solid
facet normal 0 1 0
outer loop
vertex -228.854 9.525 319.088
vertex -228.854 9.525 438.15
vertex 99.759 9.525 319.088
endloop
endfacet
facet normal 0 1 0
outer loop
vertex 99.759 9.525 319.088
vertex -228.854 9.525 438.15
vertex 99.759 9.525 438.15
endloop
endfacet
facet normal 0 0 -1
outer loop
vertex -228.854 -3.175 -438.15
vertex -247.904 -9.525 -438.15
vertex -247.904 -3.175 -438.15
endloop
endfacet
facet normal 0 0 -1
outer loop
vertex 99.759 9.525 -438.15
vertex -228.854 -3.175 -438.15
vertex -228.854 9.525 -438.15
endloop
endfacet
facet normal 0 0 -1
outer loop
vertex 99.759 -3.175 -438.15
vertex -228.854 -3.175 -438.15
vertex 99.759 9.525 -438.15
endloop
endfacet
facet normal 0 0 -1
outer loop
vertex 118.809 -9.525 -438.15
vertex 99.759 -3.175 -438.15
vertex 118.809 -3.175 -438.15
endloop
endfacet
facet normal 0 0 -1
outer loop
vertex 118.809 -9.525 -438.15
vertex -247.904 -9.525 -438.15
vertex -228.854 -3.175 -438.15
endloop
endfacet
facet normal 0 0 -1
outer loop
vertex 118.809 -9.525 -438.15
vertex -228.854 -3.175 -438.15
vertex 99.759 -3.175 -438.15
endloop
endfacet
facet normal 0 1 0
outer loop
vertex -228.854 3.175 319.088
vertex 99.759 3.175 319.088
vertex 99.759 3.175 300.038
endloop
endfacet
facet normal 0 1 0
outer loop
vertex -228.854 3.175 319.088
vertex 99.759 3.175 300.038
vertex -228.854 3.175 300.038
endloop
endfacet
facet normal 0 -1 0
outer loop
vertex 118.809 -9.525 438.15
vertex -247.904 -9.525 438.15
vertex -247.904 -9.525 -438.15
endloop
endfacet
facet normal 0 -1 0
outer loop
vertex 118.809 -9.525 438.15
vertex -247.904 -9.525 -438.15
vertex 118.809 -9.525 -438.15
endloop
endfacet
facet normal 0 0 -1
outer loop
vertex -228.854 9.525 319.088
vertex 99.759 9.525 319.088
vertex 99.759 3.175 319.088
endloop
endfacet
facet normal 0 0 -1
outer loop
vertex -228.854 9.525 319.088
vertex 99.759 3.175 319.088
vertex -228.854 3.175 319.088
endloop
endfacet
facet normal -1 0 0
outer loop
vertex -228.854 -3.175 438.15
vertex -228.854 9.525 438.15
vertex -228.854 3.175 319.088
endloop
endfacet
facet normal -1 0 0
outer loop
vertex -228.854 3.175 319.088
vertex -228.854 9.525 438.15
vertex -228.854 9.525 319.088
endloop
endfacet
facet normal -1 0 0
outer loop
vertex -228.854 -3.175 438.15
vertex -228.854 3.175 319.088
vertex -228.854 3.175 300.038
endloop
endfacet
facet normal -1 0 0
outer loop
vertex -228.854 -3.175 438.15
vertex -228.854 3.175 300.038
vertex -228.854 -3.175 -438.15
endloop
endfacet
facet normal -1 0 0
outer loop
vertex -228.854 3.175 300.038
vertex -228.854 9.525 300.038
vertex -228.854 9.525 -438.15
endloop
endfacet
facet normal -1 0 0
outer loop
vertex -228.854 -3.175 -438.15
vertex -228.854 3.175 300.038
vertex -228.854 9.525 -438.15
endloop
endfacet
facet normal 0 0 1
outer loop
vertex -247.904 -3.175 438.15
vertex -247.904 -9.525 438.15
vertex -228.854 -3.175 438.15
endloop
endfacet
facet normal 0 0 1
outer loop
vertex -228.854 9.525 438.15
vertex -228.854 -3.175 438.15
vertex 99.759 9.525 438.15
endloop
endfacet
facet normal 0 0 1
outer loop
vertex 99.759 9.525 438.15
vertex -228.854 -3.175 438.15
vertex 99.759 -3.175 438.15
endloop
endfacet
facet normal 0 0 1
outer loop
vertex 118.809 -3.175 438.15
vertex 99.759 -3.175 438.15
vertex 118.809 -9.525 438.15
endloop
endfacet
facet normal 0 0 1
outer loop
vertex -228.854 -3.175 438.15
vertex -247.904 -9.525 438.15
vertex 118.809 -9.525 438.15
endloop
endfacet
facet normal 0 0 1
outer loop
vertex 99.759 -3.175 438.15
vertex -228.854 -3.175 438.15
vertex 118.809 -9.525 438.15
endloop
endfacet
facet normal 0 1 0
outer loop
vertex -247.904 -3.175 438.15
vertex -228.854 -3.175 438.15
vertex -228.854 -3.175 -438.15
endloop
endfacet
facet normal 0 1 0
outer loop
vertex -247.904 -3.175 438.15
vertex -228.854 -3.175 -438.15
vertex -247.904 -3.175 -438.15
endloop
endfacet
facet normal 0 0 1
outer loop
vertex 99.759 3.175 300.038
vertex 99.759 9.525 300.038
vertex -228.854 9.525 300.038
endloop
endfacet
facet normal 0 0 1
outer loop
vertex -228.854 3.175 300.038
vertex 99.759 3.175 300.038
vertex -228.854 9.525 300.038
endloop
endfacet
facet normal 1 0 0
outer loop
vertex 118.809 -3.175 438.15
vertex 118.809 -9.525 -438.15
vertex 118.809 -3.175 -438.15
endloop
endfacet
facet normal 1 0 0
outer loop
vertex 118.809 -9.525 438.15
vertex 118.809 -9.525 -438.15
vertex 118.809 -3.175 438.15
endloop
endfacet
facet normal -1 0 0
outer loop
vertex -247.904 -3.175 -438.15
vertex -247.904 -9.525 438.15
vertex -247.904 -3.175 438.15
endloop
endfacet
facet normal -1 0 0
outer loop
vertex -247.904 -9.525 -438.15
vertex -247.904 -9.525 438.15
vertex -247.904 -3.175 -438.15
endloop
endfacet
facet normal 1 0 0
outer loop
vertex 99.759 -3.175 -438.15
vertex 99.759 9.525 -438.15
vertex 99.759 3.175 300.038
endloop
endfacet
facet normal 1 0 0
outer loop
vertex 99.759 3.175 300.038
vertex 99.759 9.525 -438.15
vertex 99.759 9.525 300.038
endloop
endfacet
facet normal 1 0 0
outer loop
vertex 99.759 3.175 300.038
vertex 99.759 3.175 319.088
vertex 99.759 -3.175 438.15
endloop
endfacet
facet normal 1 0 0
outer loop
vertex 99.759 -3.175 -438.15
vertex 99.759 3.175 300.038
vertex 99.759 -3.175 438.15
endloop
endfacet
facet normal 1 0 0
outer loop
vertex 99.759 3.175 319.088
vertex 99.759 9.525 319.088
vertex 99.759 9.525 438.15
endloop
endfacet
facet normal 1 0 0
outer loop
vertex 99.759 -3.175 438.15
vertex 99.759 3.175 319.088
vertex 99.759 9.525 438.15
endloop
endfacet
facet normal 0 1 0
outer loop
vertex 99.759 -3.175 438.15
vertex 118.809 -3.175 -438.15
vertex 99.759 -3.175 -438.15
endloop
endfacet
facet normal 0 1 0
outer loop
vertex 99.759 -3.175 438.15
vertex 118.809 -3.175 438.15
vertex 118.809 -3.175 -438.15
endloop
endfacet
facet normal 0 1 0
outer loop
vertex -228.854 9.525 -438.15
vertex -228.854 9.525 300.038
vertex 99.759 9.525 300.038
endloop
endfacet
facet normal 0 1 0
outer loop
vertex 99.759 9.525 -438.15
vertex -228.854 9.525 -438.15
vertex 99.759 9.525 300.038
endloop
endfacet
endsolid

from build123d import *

# Parameters (mm, degrees)
F0_W     = 366.7125
F0_H     = 438.15
F1_DEPTH = 9.525
F2_W     = 366.7125
F2_H     = 19.05
F3_DEPTH = 6.35
F4_W     = 19.05
F4_H     = 738.1875
F4_H_2   = 138.1125
F5_DEPTH = 12.7


with BuildPart() as f1:
    # F0 (on Front) → F1 (new body, symmetric)
    with BuildSketch(Plane.XZ):
        with Locations((-64.5477453259, 219.075)):
            Rectangle(F0_W, F0_H)
        with Locations((-64.5477453259, -219.075)):
            Rectangle(F0_W, F0_H)
    extrude(amount=F1_DEPTH, both=True)

    # F2 (on face) → F3 (cut)
    with BuildSketch(Plane(origin=(0, 9.525, 0), x_dir=(-1, 0, 0), z_dir=(0, 1, 0))):
        with Locations((64.5477453259, 309.5625)):
            Rectangle(F2_W, F2_H)
    extrude(amount=-F3_DEPTH, mode=Mode.SUBTRACT)

    # F4 (on face) → F5 (cut)
    with BuildSketch(Plane(origin=(0, 9.525, 0), x_dir=(-1, 0, 0), z_dir=(0, 1, 0))):
        with Locations((-109.2835046741, -69.05625)):
            Rectangle(F4_W, F4_H)
        with Locations((-109.2835046741, 369.09375)):
            Rectangle(F4_W, F4_H_2)
        with Locations((238.3789953259, 369.09375)):
            Rectangle(F4_W, F4_H_2)
        with Locations((238.3789953259, -69.05625)):
            Rectangle(F4_W, F4_H)
    extrude(amount=-F5_DEPTH, mode=Mode.SUBTRACT)


solid = f1.part
